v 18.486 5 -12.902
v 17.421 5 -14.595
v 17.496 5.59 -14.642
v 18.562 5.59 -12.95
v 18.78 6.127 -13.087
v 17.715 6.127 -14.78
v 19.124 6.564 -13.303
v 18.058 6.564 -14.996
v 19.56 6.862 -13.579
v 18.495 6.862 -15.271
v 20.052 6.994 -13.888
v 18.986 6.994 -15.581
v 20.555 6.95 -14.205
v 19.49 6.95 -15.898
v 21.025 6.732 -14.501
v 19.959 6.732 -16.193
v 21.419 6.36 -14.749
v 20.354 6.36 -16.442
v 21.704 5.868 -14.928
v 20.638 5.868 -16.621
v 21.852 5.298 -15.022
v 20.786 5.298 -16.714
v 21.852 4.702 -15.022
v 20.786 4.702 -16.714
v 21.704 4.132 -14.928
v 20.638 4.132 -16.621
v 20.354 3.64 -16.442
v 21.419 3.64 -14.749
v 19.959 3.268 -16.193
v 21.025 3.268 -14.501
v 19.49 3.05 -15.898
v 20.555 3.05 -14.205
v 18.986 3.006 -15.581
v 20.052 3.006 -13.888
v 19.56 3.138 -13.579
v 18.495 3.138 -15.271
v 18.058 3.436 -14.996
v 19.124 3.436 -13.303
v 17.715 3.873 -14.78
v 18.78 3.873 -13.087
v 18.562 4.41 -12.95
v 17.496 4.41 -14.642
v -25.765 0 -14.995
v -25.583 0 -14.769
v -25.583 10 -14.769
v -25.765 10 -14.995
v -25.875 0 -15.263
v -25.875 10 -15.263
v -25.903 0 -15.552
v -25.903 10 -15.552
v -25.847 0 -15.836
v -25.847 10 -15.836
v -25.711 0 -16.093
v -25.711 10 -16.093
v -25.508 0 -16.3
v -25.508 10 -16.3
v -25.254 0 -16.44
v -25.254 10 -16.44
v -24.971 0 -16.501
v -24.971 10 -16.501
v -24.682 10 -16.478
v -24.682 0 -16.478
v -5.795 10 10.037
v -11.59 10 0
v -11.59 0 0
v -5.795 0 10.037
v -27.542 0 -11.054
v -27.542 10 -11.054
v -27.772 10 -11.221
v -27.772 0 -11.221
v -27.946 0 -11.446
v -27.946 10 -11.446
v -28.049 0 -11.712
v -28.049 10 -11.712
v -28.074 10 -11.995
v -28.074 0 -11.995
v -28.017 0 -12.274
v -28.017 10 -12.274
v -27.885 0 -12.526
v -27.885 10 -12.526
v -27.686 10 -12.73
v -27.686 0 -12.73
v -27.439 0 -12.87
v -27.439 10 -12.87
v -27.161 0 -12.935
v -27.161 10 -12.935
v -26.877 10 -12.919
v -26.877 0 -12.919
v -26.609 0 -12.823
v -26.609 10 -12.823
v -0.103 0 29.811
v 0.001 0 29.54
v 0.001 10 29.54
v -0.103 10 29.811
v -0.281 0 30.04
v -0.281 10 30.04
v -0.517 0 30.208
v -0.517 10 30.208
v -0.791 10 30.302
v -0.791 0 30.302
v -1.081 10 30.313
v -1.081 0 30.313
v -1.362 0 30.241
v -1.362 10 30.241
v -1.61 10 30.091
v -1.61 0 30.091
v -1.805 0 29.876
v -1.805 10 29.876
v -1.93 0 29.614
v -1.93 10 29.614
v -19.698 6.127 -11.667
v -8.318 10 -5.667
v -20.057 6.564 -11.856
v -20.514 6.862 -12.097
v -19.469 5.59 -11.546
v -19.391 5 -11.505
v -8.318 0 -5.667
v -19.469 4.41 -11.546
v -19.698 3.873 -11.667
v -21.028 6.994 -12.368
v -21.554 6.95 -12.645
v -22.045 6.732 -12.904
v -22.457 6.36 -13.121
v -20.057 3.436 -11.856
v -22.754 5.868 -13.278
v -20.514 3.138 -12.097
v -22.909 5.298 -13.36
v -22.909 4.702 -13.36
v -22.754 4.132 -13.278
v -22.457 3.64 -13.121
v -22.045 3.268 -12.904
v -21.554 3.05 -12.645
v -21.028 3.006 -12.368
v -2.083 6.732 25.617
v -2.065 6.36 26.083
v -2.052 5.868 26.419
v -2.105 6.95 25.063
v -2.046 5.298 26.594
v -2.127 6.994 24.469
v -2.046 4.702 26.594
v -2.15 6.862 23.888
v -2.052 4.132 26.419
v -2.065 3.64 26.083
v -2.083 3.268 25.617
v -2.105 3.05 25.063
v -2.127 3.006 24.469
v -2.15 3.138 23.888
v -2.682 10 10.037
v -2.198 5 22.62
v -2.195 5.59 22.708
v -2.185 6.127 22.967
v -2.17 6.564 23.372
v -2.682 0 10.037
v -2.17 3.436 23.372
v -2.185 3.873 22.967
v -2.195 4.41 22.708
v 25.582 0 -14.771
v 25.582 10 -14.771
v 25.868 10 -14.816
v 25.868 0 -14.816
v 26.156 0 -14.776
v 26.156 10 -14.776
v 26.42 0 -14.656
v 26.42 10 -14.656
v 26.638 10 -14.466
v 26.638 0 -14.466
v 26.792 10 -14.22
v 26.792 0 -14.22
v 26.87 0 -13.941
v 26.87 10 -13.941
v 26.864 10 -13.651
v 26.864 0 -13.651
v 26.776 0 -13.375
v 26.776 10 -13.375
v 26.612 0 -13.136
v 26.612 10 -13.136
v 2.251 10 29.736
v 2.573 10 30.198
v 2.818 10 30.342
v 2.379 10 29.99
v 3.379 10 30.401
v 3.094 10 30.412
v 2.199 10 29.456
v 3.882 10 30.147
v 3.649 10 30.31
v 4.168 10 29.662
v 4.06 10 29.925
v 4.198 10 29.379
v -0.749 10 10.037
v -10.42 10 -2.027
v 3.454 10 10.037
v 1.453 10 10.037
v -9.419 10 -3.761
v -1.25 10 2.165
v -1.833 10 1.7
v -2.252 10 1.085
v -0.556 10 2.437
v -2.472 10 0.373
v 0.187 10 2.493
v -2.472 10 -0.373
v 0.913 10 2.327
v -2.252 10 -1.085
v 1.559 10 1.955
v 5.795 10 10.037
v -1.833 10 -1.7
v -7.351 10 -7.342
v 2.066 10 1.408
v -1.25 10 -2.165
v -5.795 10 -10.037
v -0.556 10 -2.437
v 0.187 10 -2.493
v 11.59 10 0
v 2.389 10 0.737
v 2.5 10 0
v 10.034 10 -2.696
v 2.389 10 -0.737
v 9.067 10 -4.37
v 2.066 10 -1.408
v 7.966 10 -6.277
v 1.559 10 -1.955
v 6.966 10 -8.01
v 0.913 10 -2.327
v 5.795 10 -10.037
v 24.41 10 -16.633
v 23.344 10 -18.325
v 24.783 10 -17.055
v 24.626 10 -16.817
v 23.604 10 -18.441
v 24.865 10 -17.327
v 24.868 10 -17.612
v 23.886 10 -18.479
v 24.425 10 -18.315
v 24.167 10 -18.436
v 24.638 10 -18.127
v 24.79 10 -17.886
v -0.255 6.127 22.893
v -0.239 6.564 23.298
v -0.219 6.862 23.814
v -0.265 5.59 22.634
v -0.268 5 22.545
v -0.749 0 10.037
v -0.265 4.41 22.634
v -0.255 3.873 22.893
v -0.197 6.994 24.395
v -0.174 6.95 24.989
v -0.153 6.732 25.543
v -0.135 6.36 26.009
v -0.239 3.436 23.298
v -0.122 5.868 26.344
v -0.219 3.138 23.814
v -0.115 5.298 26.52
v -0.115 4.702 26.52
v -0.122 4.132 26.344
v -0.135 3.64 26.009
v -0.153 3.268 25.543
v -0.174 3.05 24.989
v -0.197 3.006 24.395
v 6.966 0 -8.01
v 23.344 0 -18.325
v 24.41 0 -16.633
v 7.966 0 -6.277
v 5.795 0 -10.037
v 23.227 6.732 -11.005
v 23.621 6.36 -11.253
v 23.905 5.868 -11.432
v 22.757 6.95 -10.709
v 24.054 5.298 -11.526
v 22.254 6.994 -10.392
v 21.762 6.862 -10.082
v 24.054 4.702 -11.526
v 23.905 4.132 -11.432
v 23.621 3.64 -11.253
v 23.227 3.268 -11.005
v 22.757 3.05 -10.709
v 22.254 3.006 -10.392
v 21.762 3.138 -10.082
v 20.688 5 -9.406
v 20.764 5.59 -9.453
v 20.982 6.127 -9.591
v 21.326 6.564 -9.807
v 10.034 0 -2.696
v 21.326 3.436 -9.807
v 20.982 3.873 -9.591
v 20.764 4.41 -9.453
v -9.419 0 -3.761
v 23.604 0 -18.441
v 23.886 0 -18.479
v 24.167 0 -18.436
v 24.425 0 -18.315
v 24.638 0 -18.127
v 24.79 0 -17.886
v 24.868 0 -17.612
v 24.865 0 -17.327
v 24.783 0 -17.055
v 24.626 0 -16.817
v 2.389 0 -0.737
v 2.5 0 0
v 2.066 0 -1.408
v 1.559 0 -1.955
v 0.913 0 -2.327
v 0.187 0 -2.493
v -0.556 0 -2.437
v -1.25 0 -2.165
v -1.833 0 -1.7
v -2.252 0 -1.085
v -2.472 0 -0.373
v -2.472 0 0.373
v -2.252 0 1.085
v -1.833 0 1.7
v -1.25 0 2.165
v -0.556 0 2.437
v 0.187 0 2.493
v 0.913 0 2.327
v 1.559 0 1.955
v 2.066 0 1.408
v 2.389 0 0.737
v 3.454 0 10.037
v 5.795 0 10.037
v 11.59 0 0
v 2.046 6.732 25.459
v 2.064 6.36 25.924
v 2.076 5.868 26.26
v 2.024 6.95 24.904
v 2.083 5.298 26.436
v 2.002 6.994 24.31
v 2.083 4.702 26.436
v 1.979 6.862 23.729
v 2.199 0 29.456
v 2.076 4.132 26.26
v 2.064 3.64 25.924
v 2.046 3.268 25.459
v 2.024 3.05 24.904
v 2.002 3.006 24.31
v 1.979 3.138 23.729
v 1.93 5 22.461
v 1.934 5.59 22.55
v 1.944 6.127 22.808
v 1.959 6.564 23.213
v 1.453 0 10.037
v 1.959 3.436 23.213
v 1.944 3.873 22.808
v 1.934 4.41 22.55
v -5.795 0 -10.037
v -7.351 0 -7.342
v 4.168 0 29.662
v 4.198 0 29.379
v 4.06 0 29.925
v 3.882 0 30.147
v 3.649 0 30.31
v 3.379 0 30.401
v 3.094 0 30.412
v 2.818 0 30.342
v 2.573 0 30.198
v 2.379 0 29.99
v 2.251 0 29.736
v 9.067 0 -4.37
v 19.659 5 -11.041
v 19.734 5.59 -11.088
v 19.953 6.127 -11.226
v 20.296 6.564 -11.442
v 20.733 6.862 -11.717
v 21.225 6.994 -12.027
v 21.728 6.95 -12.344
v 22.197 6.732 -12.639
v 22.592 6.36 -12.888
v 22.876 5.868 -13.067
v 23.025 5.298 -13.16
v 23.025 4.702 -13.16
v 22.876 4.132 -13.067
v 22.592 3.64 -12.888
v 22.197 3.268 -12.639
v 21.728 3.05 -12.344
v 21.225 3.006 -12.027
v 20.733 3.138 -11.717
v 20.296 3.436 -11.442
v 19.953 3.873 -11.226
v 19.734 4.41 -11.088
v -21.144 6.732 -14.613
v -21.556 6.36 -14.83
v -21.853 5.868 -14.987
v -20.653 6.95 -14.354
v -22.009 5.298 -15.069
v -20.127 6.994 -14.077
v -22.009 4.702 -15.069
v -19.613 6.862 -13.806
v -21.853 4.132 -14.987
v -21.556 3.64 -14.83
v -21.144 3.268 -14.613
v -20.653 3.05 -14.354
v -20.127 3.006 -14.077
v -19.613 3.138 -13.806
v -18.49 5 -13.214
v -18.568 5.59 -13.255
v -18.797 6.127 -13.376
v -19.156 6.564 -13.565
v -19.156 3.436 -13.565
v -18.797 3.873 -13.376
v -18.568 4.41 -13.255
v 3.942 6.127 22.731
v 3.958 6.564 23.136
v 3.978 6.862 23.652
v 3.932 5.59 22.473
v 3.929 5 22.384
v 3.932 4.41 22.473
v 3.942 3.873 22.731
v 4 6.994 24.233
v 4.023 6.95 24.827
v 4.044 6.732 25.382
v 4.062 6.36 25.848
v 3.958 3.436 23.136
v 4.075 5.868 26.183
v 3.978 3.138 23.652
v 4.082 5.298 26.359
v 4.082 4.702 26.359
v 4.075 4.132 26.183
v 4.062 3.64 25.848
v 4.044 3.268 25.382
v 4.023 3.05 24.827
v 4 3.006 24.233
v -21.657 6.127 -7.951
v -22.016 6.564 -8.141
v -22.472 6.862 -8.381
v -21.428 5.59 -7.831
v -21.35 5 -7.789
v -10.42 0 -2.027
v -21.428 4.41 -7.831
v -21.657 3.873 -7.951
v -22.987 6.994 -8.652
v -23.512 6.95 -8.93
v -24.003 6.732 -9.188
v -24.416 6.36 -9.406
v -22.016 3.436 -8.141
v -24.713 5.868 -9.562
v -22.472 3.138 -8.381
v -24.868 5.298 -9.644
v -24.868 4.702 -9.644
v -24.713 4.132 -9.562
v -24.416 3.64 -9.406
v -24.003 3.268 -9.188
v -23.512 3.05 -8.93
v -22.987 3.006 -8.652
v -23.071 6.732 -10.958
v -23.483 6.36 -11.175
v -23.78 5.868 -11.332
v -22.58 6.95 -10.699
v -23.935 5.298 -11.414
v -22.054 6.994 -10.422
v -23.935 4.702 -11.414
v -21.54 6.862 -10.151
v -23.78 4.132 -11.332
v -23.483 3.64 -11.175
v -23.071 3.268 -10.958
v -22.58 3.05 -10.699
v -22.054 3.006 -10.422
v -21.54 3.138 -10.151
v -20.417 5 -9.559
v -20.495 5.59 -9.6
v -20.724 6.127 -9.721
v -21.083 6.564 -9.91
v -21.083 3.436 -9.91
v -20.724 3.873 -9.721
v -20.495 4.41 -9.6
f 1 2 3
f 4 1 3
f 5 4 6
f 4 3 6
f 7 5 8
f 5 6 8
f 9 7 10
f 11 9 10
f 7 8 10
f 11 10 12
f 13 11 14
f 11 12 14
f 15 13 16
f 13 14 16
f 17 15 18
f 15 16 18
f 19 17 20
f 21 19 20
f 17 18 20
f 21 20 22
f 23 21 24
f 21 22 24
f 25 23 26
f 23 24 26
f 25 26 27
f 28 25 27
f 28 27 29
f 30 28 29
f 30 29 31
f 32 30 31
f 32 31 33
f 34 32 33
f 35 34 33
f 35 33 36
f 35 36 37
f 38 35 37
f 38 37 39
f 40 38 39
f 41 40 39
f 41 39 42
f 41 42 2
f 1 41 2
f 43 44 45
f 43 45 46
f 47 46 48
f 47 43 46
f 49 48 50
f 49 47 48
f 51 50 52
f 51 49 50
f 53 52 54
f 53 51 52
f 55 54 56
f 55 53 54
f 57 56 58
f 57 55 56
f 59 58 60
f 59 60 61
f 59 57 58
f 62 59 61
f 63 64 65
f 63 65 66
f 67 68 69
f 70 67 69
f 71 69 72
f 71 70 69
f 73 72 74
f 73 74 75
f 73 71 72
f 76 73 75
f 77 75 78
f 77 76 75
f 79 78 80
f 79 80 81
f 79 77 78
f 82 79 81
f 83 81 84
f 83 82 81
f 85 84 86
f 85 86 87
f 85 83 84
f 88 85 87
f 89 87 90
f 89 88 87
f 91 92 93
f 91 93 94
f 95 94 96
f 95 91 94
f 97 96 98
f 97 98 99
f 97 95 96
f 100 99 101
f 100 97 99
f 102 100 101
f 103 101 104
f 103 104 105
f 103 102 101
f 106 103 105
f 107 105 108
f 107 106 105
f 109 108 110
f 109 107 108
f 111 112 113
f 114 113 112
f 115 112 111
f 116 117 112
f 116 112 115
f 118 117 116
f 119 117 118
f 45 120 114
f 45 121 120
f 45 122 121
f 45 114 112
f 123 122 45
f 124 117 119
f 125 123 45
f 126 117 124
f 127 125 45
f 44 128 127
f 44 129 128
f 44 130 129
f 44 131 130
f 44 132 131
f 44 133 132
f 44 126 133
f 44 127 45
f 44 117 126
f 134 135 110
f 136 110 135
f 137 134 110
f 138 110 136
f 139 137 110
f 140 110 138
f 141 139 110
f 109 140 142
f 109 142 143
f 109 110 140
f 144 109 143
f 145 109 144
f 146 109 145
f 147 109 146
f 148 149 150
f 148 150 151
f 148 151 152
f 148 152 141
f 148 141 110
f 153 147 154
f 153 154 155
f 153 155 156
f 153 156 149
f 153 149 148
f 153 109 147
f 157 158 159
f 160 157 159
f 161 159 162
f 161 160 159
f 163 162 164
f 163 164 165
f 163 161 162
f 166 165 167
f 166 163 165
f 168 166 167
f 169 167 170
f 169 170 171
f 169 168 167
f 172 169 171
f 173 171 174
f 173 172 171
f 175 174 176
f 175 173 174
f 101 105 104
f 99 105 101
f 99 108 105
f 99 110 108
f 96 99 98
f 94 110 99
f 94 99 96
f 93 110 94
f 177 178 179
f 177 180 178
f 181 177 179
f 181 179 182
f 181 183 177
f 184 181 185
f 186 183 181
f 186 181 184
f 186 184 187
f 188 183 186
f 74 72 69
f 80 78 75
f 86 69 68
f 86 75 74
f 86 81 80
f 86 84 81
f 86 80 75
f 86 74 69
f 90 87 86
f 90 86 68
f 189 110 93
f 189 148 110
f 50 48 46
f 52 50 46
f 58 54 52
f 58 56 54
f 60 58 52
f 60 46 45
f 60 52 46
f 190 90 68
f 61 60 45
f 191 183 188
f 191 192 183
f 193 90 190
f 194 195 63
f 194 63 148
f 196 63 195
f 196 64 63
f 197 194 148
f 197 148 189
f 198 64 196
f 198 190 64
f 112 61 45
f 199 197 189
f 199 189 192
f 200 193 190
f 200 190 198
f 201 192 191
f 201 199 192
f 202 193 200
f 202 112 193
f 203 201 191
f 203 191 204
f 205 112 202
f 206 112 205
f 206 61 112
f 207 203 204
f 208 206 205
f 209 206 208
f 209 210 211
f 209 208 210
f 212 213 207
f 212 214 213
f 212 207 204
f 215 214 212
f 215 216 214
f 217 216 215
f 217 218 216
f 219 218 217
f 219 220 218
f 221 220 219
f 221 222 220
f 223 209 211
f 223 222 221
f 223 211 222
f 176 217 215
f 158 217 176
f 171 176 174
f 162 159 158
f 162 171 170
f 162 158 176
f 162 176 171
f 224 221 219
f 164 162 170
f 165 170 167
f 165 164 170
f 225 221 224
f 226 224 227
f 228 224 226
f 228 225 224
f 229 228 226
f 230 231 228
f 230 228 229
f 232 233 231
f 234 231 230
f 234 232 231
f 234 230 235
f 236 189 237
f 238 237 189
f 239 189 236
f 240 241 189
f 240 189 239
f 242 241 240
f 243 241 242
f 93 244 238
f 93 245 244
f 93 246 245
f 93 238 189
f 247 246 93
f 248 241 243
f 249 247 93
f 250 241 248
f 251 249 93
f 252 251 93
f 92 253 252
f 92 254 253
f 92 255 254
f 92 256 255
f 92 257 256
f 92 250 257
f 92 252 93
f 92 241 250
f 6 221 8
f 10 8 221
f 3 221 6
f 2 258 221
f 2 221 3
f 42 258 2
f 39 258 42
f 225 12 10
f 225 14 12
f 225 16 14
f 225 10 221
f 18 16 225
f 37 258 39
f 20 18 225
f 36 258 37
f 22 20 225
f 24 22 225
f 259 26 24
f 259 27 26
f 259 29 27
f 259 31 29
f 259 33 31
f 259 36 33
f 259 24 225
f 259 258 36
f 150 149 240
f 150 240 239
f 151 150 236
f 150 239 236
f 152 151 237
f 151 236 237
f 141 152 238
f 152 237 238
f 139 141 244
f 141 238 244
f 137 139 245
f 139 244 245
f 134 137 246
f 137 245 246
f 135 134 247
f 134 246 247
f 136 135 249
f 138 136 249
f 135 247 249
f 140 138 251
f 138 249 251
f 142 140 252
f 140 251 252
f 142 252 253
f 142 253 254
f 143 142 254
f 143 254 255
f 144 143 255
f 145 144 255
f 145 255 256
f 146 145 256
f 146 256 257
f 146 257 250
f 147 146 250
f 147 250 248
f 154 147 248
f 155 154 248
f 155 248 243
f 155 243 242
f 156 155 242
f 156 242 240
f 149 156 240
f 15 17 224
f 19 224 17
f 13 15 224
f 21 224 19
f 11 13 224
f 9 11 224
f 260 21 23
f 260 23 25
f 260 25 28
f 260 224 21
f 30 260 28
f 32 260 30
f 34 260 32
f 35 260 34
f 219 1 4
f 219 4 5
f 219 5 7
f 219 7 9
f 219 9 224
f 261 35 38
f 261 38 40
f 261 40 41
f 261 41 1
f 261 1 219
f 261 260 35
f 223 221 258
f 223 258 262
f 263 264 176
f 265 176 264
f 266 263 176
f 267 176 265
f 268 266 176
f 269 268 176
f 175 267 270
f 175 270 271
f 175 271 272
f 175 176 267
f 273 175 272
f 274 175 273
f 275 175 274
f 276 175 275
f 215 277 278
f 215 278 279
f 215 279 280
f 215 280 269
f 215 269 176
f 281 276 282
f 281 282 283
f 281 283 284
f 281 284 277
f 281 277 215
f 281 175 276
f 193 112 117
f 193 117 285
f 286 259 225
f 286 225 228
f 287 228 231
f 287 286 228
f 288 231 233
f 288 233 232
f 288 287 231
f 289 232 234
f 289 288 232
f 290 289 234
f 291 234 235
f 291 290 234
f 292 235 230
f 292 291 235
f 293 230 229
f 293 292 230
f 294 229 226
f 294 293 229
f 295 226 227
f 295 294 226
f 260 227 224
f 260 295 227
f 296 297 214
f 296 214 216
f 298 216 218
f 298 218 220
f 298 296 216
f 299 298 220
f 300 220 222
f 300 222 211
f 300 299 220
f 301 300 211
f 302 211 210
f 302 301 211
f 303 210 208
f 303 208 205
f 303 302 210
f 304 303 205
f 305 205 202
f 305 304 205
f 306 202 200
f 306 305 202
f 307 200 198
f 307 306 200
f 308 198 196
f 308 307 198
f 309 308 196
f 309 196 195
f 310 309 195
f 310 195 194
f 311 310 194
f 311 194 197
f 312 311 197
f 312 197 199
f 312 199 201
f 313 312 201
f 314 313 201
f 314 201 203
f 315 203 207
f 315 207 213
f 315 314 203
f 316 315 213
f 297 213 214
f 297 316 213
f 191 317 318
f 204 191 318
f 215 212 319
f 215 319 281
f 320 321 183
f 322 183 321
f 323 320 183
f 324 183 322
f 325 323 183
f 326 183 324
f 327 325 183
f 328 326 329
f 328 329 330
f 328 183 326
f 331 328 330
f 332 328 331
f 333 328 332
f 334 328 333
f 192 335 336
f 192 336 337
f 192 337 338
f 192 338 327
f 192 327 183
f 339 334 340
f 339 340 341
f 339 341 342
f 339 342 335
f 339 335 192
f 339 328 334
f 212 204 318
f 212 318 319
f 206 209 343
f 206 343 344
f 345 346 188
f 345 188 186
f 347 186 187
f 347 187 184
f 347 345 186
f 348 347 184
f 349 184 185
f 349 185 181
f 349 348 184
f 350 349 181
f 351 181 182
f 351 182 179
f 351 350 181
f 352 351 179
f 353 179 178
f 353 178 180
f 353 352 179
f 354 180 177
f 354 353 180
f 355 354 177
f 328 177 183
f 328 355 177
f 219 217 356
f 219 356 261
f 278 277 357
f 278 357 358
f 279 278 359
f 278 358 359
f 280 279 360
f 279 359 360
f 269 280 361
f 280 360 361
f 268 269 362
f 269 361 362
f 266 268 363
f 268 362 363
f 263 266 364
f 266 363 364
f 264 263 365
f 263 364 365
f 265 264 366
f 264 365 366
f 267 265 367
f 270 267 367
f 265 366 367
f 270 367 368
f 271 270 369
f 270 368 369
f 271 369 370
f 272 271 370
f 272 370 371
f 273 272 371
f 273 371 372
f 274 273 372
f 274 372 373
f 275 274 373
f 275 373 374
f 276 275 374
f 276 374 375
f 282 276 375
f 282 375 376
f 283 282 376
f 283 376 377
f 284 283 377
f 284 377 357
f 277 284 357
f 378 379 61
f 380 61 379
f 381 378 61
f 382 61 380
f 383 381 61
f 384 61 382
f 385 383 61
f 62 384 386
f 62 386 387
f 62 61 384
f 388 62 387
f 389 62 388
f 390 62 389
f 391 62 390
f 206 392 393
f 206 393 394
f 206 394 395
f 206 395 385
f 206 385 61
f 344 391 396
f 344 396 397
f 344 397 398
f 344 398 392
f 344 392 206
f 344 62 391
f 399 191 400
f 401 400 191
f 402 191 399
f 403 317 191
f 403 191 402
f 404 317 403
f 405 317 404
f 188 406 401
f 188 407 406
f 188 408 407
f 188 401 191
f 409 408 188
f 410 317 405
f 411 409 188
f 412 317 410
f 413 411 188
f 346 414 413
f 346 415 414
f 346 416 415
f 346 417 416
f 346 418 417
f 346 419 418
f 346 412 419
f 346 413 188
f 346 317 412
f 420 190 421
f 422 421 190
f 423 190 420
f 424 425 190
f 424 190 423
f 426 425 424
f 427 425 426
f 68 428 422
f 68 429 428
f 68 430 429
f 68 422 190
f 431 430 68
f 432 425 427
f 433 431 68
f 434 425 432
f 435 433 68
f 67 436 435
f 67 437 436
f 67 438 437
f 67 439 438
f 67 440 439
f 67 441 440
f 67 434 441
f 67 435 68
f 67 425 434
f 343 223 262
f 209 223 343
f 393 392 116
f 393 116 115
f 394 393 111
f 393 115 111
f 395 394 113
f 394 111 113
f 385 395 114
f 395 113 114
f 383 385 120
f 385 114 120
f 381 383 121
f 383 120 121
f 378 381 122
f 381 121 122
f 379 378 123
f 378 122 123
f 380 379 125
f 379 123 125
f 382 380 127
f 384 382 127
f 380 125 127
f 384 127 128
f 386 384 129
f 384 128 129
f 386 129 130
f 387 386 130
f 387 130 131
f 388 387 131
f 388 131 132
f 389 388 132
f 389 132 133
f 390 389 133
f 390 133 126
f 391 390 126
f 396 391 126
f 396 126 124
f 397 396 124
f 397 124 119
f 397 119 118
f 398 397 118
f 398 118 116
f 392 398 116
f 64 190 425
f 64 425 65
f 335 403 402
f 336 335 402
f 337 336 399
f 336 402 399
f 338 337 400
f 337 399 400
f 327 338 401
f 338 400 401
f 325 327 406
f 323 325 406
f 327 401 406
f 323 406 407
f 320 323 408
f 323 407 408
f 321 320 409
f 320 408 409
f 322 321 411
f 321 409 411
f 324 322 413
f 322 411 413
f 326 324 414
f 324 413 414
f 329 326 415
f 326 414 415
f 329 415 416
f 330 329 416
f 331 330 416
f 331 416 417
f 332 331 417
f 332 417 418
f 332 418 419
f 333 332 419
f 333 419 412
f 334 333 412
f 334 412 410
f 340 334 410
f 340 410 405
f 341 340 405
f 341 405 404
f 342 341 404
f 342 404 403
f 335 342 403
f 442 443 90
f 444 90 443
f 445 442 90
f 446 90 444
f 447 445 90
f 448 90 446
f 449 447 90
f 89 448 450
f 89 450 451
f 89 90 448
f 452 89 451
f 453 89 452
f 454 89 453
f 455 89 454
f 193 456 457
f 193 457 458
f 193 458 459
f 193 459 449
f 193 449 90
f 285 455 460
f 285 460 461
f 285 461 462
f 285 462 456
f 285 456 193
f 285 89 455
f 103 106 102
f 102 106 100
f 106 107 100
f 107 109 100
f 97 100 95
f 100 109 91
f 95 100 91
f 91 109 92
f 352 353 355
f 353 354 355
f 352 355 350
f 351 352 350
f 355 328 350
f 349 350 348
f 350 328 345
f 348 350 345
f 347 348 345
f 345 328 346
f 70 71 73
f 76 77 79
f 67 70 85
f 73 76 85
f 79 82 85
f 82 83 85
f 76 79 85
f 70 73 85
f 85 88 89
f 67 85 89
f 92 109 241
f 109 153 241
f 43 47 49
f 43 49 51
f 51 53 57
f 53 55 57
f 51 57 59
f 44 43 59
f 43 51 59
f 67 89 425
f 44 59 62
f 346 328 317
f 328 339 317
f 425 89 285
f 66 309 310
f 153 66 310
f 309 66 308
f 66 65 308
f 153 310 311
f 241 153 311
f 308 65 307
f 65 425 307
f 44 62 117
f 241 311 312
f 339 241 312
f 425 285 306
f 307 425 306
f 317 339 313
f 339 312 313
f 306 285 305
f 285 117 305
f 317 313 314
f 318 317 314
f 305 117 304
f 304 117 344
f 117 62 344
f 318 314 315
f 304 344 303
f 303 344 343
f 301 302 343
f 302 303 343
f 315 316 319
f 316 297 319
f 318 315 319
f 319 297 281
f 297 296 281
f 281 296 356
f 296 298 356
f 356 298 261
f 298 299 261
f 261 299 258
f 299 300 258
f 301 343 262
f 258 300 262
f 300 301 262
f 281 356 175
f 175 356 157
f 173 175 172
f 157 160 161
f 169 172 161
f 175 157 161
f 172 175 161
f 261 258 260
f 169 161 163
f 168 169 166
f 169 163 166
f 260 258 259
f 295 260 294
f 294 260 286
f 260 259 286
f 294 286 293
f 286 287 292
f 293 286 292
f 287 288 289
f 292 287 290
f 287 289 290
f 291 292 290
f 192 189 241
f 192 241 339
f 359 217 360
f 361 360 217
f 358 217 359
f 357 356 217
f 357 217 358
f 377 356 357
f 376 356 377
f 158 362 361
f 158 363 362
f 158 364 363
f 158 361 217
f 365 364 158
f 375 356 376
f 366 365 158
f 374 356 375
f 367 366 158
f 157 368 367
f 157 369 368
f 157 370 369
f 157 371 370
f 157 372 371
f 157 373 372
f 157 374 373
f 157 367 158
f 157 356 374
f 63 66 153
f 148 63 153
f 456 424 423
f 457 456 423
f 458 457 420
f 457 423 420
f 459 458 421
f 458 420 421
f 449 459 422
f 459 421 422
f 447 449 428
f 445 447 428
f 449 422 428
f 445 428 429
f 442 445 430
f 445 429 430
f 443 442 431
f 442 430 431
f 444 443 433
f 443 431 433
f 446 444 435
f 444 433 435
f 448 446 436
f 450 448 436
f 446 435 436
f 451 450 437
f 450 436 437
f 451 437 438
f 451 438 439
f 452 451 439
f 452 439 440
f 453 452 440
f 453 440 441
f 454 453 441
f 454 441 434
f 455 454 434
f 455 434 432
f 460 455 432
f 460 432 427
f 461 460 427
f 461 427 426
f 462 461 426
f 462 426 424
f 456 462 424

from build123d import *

# Parameters (mm, degrees)
SKETCH1_R           = 2.5
BOSS_EXTRUDE1_DEPTH = 10
SKETCH2_R           = 2
CUT_EXTRUDE1_DEPTH  = 10
CIRPATTERN1_COUNT   = 3
SKETCH3_R           = 2.5
BOSS_EXTRUDE3_DEPTH = 10


with BuildPart() as part:
    # Sketch1 → Boss-Extrude1 (new body)
    with BuildSketch(Plane(origin=(0, 0, 0), x_dir=(1, 0, 0), z_dir=(0, 1, 0))):
        with BuildLine():
            Line((3.42943918, -9.393558799), (4.197898245, -29.378790113))
            ThreePointArc((4.197898245, -29.378790113), (3.237059632, -30.416474632), (2.199375114, -29.455636019))
            Line((2.199375114, -29.455636019), (1.447231615, -9.894721858))
            ThreePointArc((1.447231615, -9.894721858), (0.350023332, -9.993872306), (-0.751433173, -9.971727442))
            Line((-0.751433173, -9.971727442), (0.000999669, -29.540166516))
            ThreePointArc((0.000999669, -29.540166516), (-0.935779597, -30.318112399), (-1.929530696, -29.614398009))
            Line((-1.929530696, -29.614398009), (-2.697989761, -9.629166695))
            ThreePointArc((-2.697989761, -9.629166695), (-8.461744243, -5.329060364), (-9.849780142, 1.726797949))
            Line((-9.849780142, 1.726797949), (-27.541727692, 11.053908534))
            ThreePointArc((-27.541727692, 11.053908534), (-27.959969541, 12.404861441), (-26.609016634, 12.823103289))
            Line((-26.609016634, 12.823103289), (-9.2926963, 3.694021585))
            ThreePointArc((-9.2926963, 3.694021585), (-8.829958965, 4.693807055), (-8.260052699, 5.636623938))
            Line((-8.260052699, 5.636623938), (-25.58303447, 14.769217519))
            ThreePointArc((-25.58303447, 14.769217519), (-25.788365734, 15.969465103), (-24.682055646, 16.478221605))
            Line((-24.682055646, 16.478221605), (-6.990108095, 7.15111102))
            ThreePointArc((-6.990108095, 7.15111102), (-0.384229532, 9.992615657), (6.420340962, 7.66676085))
            Line((6.420340962, 7.66676085), (23.343829448, 18.324881579))
            ThreePointArc((23.343829448, 18.324881579), (24.722909908, 18.011613191), (24.40964152, 16.63253273))
            Line((24.40964152, 16.63253273), (7.845464685, 6.200700273))
            ThreePointArc((7.845464685, 6.200700273), (8.479935633, 5.300065251), (9.011485871, 4.335103505))
            Line((9.011485871, 4.335103505), (25.582034801, 14.770948997))
            ThreePointArc((25.582034801, 14.770948997), (26.724145331, 14.348647296), (26.611586342, 13.136176404))
            Line((26.611586342, 13.136176404), (9.688097856, 2.478055676))
            ThreePointArc((9.688097856, 2.478055676), (8.845973775, -4.663555293), (3.42943918, -9.393558799))
        make_face()
        Circle(SKETCH1_R, mode=Mode.SUBTRACT)
    extrude(amount=BOSS_EXTRUDE1_DEPTH)

    # Sketch2 → Cut-Extrude1 (cut)
    with BuildSketch(Plane(origin=(3.063714471, 0, -0.117803948), x_dir=(-0.038422953, 0, -0.999261566), z_dir=(0.999261566, 0, -0.038422953))):
        with Locations((-24.518391454, 5)):
            Circle(SKETCH2_R)
    cut_extrude1 = extrude(amount=-CUT_EXTRUDE1_DEPTH, mode=Mode.SUBTRACT)

    # CirPattern1: Cut-Extrude1 ×3 about axis
    cirpattern1_axis = Axis((0, 10, 0), (0, -1, 0))
    for i in range(1, CIRPATTERN1_COUNT):
        add(cut_extrude1.rotate(cirpattern1_axis, i * 360 / CIRPATTERN1_COUNT), mode=Mode.SUBTRACT)

    # Sketch3 → Boss-Extrude3 (add)
    with BuildSketch(Plane(origin=(0, 10, 0), x_dir=(1, 0, 0), z_dir=(0, 1, 0))):
        Polygon((11.5901527, 0), (5.79507635, 10.037366672), (-5.79507635, 10.037366672), (-11.5901527, 0), (-5.79507635, -10.037366672), (5.79507635, -10.037366672), align=None)
        Circle(SKETCH3_R, mode=Mode.SUBTRACT)
    extrude(amount=-BOSS_EXTRUDE3_DEPTH)


solid = part.part
